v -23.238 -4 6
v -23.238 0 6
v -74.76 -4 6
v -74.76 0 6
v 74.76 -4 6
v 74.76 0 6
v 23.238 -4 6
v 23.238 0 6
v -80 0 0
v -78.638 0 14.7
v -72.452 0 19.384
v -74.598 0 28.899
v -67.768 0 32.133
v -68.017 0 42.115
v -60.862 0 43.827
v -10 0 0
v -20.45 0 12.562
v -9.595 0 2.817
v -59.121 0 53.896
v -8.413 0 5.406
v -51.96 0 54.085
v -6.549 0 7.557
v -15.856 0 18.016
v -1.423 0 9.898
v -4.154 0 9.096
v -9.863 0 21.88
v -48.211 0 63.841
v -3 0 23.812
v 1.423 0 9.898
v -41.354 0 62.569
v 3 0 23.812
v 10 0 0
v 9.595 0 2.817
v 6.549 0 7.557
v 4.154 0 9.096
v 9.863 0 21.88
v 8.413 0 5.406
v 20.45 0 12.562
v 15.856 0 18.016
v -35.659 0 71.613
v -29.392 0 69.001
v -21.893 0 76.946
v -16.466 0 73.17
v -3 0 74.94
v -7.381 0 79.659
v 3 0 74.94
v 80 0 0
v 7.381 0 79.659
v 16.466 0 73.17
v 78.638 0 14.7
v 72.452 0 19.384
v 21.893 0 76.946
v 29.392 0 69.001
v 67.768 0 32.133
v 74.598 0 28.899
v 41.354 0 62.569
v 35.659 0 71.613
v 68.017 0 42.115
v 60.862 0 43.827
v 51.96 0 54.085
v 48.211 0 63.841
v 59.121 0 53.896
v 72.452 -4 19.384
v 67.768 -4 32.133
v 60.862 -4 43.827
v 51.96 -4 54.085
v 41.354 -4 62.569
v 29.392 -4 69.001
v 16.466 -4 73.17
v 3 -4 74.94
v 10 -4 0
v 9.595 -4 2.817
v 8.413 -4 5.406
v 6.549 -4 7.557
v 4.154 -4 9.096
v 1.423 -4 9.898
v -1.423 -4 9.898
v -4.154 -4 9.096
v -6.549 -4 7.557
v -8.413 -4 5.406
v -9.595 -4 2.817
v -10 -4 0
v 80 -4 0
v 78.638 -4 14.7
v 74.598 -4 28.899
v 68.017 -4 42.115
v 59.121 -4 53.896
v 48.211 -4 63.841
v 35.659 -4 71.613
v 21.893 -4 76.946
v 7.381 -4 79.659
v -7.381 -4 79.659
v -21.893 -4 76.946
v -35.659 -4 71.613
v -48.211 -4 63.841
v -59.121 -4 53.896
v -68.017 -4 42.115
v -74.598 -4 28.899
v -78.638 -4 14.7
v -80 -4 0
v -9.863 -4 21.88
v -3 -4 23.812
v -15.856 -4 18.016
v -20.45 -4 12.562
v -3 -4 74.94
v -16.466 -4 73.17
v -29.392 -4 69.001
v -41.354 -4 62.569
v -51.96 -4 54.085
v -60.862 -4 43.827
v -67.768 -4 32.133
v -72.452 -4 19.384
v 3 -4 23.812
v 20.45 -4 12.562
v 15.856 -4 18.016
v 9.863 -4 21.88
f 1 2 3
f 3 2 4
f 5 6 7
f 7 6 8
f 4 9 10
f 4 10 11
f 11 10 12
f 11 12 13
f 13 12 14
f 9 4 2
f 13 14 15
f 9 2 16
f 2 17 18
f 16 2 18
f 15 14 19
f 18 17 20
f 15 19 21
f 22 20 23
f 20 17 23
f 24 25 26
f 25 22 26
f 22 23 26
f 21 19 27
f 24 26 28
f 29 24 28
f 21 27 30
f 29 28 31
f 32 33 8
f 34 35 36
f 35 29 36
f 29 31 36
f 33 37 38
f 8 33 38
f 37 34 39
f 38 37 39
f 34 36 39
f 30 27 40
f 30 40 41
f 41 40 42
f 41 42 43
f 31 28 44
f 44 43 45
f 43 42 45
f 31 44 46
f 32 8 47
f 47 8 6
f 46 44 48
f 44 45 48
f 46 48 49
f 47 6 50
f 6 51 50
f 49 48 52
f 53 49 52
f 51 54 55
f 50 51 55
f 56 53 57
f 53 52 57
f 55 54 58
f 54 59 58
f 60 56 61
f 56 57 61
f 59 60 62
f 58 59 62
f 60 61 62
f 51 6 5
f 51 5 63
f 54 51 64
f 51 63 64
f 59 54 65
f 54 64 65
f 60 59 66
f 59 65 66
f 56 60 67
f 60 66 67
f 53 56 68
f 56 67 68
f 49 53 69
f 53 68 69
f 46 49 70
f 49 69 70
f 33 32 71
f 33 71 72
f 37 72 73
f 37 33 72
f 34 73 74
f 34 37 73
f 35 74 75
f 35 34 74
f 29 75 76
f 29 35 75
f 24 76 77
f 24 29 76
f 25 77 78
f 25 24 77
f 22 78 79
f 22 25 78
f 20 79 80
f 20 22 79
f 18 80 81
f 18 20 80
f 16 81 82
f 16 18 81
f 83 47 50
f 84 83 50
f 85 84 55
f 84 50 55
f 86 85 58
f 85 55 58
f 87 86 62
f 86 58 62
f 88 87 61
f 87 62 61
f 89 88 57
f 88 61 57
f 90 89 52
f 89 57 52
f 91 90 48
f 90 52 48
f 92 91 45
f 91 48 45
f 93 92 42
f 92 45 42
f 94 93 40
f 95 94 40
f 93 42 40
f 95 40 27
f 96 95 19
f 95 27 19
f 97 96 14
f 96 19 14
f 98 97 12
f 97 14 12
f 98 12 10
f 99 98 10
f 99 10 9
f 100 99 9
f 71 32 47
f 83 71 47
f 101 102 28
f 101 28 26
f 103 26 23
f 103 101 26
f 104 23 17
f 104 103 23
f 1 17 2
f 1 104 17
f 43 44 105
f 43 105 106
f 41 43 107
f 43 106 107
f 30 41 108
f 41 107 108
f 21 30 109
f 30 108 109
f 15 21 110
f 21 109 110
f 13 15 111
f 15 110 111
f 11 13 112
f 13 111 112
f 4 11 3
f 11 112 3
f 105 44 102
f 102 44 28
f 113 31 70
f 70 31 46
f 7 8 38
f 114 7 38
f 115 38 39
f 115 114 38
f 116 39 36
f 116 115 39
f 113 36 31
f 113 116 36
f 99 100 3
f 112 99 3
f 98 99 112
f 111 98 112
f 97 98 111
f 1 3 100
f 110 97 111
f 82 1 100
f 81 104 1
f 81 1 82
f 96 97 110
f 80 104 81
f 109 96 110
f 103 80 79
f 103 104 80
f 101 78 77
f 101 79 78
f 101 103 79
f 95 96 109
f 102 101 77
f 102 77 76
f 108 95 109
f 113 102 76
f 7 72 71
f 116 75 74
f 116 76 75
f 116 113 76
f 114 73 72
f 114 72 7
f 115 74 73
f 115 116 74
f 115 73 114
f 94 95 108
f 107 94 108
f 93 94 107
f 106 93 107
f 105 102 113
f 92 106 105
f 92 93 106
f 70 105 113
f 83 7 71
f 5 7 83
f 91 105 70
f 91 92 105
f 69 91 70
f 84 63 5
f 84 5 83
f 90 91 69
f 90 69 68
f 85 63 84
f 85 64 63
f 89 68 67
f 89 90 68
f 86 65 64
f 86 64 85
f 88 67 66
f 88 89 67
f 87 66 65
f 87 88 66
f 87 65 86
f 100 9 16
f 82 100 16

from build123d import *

# Parameters (mm, degrees)
F0_R     = 80
F0_R_2   = 10
F1_DEPTH = 4
F2_R     = 75
F2_R_2   = 24
F3_DEPTH = 25
F4_W     = 3
F4_H     = 45
F5_DEPTH = 4
F6_W     = 170.305036
F6_H     = 83.79095
F7_DEPTH = 25


with BuildPart() as f1:
    # F0 (on Front) → F1 (new body)
    with BuildSketch(Plane.XZ):
        Circle(F0_R)
        Circle(F0_R_2, mode=Mode.SUBTRACT)
    extrude(amount=F1_DEPTH)

    # F2 (on face) → F3 (cut)
    with BuildSketch(Plane.XZ.offset(4)):
        Circle(F2_R)
        Circle(F2_R_2, mode=Mode.SUBTRACT)
    extrude(amount=-F3_DEPTH, mode=Mode.SUBTRACT)

    # F4 (on Front) → F5 (join)
    with BuildSketch(Plane.XZ):
        Polygon((17.140831, 6), (17.140831, 0), (76.595739, 0), (77.140831, 0), (77.140831, 6), align=None)
        with Locations((1.5, -43.351822)):
            Rectangle(F4_W, F4_H)
        with Locations((-1.5, -43.351822)):
            Rectangle(F4_W, F4_H)
        Polygon((-76.336667, 0), (-17.078082, 0), (-17.078082, 6), (-77.078082, 6), (-77.078082, 0), align=None)
        Polygon((3, 76.524103), (-3, 76.524103), (-3, 16.524103), (0, 16.524103), (3, 16.524103), align=None)
    extrude(amount=F5_DEPTH)

    # F6 (on Front) → F7 (cut)
    with BuildSketch(Plane.XZ):
        with Locations((2.269793, -41.895475)):
            Rectangle(F6_W, F6_H)
    extrude(amount=F7_DEPTH, mode=Mode.SUBTRACT)


solid = f1.part
